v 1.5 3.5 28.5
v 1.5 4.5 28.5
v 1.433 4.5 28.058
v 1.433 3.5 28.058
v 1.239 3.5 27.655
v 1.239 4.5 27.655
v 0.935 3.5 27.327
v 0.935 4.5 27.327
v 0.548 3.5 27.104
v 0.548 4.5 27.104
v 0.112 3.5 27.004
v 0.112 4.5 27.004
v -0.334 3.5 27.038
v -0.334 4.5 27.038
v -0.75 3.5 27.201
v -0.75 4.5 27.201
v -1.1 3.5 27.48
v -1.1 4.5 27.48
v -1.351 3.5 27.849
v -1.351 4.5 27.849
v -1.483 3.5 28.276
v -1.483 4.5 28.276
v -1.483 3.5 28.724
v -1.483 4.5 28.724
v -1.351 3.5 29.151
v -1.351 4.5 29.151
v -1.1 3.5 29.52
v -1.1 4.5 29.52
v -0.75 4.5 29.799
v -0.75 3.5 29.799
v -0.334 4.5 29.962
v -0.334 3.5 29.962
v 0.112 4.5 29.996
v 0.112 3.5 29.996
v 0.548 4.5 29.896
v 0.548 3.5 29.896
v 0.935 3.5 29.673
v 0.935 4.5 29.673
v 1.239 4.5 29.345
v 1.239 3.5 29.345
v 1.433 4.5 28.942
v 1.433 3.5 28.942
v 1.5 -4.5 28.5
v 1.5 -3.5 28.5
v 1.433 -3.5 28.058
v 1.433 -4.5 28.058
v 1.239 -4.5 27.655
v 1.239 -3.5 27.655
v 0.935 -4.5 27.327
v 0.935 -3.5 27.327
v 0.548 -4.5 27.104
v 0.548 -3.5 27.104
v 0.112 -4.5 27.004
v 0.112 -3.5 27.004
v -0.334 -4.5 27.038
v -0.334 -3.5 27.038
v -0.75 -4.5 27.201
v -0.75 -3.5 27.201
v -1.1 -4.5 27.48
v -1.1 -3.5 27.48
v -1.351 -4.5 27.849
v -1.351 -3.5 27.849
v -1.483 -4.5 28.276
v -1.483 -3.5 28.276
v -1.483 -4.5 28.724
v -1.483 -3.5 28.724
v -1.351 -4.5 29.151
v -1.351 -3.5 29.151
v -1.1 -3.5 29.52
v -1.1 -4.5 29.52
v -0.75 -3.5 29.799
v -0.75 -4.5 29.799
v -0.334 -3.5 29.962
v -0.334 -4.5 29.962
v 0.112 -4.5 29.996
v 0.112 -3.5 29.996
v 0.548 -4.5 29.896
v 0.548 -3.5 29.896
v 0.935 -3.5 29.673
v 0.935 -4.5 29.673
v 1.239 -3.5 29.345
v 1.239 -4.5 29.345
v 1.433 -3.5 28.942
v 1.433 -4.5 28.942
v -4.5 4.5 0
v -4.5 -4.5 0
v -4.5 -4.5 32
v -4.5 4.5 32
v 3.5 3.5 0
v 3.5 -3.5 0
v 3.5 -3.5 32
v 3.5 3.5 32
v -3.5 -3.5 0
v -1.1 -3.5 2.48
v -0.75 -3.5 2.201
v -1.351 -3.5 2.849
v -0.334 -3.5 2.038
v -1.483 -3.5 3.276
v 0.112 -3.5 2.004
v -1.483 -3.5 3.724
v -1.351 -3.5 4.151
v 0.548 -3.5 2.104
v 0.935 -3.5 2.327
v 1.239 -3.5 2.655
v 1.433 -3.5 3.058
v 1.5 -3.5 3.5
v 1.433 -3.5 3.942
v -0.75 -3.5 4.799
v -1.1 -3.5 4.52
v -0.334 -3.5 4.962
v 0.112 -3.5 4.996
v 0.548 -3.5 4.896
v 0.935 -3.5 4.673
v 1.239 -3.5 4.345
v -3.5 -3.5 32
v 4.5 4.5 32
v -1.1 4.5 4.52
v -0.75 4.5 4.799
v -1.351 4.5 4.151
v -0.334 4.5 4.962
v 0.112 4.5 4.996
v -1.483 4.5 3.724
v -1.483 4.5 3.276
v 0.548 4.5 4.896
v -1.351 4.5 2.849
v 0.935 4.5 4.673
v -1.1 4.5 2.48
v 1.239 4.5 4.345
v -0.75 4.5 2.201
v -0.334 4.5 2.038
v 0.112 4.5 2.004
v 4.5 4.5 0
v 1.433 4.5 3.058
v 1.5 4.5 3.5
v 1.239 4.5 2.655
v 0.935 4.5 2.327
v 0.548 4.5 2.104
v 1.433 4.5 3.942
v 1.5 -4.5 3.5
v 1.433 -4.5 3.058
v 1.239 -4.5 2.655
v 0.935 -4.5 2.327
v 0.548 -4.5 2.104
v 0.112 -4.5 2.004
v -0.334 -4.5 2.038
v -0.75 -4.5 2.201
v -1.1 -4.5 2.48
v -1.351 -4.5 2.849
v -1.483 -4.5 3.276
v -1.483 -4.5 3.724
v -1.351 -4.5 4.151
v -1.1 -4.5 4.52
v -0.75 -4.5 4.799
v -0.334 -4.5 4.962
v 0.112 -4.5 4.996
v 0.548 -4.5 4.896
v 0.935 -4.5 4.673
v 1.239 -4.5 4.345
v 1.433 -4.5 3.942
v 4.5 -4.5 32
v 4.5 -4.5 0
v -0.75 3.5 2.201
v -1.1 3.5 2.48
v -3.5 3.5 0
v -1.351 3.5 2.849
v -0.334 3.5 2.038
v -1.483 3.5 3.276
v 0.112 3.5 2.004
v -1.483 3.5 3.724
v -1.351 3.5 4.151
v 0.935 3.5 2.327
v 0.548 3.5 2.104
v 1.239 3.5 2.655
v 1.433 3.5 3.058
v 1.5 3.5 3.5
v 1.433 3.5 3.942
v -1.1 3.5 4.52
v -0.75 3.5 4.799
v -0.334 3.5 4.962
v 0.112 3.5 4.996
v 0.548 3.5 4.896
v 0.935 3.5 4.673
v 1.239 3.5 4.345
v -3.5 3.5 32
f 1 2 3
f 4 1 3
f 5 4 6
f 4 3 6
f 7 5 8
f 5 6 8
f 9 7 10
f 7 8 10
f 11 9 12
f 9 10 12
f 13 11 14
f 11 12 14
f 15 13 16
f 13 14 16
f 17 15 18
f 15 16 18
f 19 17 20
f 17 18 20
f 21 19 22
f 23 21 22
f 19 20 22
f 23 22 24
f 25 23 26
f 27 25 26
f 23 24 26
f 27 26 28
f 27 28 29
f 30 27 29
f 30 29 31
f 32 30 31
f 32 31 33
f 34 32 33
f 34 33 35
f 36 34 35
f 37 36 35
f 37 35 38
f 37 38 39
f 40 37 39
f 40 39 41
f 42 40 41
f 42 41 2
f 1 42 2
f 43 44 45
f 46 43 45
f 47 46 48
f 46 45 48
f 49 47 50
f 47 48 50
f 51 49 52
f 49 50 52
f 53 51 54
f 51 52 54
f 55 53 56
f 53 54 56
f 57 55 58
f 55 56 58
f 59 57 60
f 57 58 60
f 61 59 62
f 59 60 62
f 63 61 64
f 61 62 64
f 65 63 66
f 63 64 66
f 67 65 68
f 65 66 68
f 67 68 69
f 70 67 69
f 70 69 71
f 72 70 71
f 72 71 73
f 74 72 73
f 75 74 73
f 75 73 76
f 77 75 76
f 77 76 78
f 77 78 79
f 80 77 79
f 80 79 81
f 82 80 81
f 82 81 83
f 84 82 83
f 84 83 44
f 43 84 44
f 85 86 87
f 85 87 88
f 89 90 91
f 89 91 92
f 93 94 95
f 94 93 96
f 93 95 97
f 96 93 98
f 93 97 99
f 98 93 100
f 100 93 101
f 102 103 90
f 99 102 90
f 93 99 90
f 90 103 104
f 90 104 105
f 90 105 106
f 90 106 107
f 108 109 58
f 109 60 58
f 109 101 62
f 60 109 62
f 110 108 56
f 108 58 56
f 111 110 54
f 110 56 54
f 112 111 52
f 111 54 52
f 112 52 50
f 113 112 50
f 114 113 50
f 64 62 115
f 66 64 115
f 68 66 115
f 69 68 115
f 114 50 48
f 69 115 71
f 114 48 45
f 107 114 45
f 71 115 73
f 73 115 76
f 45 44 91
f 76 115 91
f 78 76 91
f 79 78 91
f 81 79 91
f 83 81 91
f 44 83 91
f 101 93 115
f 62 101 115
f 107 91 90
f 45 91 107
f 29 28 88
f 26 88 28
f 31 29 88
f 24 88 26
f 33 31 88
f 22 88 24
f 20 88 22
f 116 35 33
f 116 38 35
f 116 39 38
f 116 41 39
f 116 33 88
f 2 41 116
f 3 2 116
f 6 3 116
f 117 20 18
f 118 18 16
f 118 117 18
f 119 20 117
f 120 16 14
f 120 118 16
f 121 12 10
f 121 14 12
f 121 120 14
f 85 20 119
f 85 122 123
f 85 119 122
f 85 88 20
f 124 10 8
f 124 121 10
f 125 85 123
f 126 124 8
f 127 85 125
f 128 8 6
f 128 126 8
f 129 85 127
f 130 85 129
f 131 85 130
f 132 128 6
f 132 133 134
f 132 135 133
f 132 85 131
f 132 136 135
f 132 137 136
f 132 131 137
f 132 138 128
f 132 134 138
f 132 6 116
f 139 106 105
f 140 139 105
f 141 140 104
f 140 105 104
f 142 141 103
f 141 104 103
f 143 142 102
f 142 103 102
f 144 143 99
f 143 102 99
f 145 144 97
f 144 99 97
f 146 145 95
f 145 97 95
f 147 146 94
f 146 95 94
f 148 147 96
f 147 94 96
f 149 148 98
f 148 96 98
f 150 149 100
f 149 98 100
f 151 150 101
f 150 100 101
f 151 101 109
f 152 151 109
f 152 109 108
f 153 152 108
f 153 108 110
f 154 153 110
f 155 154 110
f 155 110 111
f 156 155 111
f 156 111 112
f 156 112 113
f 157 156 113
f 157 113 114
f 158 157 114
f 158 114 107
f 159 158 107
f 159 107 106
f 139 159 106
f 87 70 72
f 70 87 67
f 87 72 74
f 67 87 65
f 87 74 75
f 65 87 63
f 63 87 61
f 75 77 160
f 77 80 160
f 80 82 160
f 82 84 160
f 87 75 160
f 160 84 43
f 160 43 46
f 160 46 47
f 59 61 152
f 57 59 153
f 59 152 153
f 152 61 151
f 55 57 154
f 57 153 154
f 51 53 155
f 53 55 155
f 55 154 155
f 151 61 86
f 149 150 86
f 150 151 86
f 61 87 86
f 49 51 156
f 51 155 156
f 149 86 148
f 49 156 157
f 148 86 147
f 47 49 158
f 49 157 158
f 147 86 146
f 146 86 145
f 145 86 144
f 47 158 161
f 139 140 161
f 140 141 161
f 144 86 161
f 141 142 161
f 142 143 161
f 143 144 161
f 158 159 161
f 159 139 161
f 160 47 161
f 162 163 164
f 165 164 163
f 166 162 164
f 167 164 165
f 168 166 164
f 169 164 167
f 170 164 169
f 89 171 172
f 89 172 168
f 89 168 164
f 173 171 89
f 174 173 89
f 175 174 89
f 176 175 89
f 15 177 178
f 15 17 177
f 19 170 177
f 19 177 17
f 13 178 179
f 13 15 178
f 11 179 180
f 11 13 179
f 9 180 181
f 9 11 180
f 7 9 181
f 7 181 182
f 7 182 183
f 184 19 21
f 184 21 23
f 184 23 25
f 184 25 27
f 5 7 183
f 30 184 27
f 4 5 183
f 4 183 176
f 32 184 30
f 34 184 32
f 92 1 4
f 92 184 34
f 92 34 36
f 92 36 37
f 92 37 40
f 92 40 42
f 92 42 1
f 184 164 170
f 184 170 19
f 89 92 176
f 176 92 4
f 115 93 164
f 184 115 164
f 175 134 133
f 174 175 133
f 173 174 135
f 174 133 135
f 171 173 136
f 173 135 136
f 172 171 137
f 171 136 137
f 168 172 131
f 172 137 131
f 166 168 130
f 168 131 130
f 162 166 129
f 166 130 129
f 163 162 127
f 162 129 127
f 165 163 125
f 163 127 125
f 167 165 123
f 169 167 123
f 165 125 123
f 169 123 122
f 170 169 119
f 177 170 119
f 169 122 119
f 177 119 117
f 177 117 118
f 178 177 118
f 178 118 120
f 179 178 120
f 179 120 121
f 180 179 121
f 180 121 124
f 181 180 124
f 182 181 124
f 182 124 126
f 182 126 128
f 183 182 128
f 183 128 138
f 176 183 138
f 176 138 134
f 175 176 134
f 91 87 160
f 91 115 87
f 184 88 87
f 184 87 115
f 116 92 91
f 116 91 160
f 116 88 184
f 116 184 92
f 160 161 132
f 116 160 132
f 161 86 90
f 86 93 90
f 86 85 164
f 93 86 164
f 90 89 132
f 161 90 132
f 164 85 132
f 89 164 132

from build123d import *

# Parameters (mm, degrees)
SKETCH_1_W          = 9
SKETCH_1_H          = 9
EXTRUDE_1_DEPTH     = 32
SKETCH_2_W          = 7
SKETCH_2_H          = 7
CUT_EXTRUDE_1_DEPTH = 40
SKETCH_3_R          = 1.5
CUT_EXTRUDE_2_DEPTH = 38


with BuildPart() as part:
    # ｽｹｯﾁ1 → ﾎﾞｽ - 押し出し1 (new body)
    with BuildSketch(Plane.XY):
        Rectangle(SKETCH_1_W, SKETCH_1_H)
    extrude(amount=EXTRUDE_1_DEPTH)

    # ｽｹｯﾁ2 → ｶｯﾄ - 押し出し1 (cut)
    with BuildSketch(Plane.XY.offset(32)):
        Rectangle(SKETCH_2_W, SKETCH_2_H)
    extrude(amount=-CUT_EXTRUDE_1_DEPTH, mode=Mode.SUBTRACT)

    # ｽｹｯﾁ3 → ｶｯﾄ - 押し出し2 (cut)
    with BuildSketch(Plane(origin=(0, 4.5, 0), x_dir=(1, 0, 0), z_dir=(0, 1, 0))):
        with Locations((0, -3.5)):
            Circle(SKETCH_3_R)
        with Locations((0, -28.5)):
            Circle(SKETCH_3_R)
    extrude(amount=-CUT_EXTRUDE_2_DEPTH, mode=Mode.SUBTRACT)


solid = part.part
